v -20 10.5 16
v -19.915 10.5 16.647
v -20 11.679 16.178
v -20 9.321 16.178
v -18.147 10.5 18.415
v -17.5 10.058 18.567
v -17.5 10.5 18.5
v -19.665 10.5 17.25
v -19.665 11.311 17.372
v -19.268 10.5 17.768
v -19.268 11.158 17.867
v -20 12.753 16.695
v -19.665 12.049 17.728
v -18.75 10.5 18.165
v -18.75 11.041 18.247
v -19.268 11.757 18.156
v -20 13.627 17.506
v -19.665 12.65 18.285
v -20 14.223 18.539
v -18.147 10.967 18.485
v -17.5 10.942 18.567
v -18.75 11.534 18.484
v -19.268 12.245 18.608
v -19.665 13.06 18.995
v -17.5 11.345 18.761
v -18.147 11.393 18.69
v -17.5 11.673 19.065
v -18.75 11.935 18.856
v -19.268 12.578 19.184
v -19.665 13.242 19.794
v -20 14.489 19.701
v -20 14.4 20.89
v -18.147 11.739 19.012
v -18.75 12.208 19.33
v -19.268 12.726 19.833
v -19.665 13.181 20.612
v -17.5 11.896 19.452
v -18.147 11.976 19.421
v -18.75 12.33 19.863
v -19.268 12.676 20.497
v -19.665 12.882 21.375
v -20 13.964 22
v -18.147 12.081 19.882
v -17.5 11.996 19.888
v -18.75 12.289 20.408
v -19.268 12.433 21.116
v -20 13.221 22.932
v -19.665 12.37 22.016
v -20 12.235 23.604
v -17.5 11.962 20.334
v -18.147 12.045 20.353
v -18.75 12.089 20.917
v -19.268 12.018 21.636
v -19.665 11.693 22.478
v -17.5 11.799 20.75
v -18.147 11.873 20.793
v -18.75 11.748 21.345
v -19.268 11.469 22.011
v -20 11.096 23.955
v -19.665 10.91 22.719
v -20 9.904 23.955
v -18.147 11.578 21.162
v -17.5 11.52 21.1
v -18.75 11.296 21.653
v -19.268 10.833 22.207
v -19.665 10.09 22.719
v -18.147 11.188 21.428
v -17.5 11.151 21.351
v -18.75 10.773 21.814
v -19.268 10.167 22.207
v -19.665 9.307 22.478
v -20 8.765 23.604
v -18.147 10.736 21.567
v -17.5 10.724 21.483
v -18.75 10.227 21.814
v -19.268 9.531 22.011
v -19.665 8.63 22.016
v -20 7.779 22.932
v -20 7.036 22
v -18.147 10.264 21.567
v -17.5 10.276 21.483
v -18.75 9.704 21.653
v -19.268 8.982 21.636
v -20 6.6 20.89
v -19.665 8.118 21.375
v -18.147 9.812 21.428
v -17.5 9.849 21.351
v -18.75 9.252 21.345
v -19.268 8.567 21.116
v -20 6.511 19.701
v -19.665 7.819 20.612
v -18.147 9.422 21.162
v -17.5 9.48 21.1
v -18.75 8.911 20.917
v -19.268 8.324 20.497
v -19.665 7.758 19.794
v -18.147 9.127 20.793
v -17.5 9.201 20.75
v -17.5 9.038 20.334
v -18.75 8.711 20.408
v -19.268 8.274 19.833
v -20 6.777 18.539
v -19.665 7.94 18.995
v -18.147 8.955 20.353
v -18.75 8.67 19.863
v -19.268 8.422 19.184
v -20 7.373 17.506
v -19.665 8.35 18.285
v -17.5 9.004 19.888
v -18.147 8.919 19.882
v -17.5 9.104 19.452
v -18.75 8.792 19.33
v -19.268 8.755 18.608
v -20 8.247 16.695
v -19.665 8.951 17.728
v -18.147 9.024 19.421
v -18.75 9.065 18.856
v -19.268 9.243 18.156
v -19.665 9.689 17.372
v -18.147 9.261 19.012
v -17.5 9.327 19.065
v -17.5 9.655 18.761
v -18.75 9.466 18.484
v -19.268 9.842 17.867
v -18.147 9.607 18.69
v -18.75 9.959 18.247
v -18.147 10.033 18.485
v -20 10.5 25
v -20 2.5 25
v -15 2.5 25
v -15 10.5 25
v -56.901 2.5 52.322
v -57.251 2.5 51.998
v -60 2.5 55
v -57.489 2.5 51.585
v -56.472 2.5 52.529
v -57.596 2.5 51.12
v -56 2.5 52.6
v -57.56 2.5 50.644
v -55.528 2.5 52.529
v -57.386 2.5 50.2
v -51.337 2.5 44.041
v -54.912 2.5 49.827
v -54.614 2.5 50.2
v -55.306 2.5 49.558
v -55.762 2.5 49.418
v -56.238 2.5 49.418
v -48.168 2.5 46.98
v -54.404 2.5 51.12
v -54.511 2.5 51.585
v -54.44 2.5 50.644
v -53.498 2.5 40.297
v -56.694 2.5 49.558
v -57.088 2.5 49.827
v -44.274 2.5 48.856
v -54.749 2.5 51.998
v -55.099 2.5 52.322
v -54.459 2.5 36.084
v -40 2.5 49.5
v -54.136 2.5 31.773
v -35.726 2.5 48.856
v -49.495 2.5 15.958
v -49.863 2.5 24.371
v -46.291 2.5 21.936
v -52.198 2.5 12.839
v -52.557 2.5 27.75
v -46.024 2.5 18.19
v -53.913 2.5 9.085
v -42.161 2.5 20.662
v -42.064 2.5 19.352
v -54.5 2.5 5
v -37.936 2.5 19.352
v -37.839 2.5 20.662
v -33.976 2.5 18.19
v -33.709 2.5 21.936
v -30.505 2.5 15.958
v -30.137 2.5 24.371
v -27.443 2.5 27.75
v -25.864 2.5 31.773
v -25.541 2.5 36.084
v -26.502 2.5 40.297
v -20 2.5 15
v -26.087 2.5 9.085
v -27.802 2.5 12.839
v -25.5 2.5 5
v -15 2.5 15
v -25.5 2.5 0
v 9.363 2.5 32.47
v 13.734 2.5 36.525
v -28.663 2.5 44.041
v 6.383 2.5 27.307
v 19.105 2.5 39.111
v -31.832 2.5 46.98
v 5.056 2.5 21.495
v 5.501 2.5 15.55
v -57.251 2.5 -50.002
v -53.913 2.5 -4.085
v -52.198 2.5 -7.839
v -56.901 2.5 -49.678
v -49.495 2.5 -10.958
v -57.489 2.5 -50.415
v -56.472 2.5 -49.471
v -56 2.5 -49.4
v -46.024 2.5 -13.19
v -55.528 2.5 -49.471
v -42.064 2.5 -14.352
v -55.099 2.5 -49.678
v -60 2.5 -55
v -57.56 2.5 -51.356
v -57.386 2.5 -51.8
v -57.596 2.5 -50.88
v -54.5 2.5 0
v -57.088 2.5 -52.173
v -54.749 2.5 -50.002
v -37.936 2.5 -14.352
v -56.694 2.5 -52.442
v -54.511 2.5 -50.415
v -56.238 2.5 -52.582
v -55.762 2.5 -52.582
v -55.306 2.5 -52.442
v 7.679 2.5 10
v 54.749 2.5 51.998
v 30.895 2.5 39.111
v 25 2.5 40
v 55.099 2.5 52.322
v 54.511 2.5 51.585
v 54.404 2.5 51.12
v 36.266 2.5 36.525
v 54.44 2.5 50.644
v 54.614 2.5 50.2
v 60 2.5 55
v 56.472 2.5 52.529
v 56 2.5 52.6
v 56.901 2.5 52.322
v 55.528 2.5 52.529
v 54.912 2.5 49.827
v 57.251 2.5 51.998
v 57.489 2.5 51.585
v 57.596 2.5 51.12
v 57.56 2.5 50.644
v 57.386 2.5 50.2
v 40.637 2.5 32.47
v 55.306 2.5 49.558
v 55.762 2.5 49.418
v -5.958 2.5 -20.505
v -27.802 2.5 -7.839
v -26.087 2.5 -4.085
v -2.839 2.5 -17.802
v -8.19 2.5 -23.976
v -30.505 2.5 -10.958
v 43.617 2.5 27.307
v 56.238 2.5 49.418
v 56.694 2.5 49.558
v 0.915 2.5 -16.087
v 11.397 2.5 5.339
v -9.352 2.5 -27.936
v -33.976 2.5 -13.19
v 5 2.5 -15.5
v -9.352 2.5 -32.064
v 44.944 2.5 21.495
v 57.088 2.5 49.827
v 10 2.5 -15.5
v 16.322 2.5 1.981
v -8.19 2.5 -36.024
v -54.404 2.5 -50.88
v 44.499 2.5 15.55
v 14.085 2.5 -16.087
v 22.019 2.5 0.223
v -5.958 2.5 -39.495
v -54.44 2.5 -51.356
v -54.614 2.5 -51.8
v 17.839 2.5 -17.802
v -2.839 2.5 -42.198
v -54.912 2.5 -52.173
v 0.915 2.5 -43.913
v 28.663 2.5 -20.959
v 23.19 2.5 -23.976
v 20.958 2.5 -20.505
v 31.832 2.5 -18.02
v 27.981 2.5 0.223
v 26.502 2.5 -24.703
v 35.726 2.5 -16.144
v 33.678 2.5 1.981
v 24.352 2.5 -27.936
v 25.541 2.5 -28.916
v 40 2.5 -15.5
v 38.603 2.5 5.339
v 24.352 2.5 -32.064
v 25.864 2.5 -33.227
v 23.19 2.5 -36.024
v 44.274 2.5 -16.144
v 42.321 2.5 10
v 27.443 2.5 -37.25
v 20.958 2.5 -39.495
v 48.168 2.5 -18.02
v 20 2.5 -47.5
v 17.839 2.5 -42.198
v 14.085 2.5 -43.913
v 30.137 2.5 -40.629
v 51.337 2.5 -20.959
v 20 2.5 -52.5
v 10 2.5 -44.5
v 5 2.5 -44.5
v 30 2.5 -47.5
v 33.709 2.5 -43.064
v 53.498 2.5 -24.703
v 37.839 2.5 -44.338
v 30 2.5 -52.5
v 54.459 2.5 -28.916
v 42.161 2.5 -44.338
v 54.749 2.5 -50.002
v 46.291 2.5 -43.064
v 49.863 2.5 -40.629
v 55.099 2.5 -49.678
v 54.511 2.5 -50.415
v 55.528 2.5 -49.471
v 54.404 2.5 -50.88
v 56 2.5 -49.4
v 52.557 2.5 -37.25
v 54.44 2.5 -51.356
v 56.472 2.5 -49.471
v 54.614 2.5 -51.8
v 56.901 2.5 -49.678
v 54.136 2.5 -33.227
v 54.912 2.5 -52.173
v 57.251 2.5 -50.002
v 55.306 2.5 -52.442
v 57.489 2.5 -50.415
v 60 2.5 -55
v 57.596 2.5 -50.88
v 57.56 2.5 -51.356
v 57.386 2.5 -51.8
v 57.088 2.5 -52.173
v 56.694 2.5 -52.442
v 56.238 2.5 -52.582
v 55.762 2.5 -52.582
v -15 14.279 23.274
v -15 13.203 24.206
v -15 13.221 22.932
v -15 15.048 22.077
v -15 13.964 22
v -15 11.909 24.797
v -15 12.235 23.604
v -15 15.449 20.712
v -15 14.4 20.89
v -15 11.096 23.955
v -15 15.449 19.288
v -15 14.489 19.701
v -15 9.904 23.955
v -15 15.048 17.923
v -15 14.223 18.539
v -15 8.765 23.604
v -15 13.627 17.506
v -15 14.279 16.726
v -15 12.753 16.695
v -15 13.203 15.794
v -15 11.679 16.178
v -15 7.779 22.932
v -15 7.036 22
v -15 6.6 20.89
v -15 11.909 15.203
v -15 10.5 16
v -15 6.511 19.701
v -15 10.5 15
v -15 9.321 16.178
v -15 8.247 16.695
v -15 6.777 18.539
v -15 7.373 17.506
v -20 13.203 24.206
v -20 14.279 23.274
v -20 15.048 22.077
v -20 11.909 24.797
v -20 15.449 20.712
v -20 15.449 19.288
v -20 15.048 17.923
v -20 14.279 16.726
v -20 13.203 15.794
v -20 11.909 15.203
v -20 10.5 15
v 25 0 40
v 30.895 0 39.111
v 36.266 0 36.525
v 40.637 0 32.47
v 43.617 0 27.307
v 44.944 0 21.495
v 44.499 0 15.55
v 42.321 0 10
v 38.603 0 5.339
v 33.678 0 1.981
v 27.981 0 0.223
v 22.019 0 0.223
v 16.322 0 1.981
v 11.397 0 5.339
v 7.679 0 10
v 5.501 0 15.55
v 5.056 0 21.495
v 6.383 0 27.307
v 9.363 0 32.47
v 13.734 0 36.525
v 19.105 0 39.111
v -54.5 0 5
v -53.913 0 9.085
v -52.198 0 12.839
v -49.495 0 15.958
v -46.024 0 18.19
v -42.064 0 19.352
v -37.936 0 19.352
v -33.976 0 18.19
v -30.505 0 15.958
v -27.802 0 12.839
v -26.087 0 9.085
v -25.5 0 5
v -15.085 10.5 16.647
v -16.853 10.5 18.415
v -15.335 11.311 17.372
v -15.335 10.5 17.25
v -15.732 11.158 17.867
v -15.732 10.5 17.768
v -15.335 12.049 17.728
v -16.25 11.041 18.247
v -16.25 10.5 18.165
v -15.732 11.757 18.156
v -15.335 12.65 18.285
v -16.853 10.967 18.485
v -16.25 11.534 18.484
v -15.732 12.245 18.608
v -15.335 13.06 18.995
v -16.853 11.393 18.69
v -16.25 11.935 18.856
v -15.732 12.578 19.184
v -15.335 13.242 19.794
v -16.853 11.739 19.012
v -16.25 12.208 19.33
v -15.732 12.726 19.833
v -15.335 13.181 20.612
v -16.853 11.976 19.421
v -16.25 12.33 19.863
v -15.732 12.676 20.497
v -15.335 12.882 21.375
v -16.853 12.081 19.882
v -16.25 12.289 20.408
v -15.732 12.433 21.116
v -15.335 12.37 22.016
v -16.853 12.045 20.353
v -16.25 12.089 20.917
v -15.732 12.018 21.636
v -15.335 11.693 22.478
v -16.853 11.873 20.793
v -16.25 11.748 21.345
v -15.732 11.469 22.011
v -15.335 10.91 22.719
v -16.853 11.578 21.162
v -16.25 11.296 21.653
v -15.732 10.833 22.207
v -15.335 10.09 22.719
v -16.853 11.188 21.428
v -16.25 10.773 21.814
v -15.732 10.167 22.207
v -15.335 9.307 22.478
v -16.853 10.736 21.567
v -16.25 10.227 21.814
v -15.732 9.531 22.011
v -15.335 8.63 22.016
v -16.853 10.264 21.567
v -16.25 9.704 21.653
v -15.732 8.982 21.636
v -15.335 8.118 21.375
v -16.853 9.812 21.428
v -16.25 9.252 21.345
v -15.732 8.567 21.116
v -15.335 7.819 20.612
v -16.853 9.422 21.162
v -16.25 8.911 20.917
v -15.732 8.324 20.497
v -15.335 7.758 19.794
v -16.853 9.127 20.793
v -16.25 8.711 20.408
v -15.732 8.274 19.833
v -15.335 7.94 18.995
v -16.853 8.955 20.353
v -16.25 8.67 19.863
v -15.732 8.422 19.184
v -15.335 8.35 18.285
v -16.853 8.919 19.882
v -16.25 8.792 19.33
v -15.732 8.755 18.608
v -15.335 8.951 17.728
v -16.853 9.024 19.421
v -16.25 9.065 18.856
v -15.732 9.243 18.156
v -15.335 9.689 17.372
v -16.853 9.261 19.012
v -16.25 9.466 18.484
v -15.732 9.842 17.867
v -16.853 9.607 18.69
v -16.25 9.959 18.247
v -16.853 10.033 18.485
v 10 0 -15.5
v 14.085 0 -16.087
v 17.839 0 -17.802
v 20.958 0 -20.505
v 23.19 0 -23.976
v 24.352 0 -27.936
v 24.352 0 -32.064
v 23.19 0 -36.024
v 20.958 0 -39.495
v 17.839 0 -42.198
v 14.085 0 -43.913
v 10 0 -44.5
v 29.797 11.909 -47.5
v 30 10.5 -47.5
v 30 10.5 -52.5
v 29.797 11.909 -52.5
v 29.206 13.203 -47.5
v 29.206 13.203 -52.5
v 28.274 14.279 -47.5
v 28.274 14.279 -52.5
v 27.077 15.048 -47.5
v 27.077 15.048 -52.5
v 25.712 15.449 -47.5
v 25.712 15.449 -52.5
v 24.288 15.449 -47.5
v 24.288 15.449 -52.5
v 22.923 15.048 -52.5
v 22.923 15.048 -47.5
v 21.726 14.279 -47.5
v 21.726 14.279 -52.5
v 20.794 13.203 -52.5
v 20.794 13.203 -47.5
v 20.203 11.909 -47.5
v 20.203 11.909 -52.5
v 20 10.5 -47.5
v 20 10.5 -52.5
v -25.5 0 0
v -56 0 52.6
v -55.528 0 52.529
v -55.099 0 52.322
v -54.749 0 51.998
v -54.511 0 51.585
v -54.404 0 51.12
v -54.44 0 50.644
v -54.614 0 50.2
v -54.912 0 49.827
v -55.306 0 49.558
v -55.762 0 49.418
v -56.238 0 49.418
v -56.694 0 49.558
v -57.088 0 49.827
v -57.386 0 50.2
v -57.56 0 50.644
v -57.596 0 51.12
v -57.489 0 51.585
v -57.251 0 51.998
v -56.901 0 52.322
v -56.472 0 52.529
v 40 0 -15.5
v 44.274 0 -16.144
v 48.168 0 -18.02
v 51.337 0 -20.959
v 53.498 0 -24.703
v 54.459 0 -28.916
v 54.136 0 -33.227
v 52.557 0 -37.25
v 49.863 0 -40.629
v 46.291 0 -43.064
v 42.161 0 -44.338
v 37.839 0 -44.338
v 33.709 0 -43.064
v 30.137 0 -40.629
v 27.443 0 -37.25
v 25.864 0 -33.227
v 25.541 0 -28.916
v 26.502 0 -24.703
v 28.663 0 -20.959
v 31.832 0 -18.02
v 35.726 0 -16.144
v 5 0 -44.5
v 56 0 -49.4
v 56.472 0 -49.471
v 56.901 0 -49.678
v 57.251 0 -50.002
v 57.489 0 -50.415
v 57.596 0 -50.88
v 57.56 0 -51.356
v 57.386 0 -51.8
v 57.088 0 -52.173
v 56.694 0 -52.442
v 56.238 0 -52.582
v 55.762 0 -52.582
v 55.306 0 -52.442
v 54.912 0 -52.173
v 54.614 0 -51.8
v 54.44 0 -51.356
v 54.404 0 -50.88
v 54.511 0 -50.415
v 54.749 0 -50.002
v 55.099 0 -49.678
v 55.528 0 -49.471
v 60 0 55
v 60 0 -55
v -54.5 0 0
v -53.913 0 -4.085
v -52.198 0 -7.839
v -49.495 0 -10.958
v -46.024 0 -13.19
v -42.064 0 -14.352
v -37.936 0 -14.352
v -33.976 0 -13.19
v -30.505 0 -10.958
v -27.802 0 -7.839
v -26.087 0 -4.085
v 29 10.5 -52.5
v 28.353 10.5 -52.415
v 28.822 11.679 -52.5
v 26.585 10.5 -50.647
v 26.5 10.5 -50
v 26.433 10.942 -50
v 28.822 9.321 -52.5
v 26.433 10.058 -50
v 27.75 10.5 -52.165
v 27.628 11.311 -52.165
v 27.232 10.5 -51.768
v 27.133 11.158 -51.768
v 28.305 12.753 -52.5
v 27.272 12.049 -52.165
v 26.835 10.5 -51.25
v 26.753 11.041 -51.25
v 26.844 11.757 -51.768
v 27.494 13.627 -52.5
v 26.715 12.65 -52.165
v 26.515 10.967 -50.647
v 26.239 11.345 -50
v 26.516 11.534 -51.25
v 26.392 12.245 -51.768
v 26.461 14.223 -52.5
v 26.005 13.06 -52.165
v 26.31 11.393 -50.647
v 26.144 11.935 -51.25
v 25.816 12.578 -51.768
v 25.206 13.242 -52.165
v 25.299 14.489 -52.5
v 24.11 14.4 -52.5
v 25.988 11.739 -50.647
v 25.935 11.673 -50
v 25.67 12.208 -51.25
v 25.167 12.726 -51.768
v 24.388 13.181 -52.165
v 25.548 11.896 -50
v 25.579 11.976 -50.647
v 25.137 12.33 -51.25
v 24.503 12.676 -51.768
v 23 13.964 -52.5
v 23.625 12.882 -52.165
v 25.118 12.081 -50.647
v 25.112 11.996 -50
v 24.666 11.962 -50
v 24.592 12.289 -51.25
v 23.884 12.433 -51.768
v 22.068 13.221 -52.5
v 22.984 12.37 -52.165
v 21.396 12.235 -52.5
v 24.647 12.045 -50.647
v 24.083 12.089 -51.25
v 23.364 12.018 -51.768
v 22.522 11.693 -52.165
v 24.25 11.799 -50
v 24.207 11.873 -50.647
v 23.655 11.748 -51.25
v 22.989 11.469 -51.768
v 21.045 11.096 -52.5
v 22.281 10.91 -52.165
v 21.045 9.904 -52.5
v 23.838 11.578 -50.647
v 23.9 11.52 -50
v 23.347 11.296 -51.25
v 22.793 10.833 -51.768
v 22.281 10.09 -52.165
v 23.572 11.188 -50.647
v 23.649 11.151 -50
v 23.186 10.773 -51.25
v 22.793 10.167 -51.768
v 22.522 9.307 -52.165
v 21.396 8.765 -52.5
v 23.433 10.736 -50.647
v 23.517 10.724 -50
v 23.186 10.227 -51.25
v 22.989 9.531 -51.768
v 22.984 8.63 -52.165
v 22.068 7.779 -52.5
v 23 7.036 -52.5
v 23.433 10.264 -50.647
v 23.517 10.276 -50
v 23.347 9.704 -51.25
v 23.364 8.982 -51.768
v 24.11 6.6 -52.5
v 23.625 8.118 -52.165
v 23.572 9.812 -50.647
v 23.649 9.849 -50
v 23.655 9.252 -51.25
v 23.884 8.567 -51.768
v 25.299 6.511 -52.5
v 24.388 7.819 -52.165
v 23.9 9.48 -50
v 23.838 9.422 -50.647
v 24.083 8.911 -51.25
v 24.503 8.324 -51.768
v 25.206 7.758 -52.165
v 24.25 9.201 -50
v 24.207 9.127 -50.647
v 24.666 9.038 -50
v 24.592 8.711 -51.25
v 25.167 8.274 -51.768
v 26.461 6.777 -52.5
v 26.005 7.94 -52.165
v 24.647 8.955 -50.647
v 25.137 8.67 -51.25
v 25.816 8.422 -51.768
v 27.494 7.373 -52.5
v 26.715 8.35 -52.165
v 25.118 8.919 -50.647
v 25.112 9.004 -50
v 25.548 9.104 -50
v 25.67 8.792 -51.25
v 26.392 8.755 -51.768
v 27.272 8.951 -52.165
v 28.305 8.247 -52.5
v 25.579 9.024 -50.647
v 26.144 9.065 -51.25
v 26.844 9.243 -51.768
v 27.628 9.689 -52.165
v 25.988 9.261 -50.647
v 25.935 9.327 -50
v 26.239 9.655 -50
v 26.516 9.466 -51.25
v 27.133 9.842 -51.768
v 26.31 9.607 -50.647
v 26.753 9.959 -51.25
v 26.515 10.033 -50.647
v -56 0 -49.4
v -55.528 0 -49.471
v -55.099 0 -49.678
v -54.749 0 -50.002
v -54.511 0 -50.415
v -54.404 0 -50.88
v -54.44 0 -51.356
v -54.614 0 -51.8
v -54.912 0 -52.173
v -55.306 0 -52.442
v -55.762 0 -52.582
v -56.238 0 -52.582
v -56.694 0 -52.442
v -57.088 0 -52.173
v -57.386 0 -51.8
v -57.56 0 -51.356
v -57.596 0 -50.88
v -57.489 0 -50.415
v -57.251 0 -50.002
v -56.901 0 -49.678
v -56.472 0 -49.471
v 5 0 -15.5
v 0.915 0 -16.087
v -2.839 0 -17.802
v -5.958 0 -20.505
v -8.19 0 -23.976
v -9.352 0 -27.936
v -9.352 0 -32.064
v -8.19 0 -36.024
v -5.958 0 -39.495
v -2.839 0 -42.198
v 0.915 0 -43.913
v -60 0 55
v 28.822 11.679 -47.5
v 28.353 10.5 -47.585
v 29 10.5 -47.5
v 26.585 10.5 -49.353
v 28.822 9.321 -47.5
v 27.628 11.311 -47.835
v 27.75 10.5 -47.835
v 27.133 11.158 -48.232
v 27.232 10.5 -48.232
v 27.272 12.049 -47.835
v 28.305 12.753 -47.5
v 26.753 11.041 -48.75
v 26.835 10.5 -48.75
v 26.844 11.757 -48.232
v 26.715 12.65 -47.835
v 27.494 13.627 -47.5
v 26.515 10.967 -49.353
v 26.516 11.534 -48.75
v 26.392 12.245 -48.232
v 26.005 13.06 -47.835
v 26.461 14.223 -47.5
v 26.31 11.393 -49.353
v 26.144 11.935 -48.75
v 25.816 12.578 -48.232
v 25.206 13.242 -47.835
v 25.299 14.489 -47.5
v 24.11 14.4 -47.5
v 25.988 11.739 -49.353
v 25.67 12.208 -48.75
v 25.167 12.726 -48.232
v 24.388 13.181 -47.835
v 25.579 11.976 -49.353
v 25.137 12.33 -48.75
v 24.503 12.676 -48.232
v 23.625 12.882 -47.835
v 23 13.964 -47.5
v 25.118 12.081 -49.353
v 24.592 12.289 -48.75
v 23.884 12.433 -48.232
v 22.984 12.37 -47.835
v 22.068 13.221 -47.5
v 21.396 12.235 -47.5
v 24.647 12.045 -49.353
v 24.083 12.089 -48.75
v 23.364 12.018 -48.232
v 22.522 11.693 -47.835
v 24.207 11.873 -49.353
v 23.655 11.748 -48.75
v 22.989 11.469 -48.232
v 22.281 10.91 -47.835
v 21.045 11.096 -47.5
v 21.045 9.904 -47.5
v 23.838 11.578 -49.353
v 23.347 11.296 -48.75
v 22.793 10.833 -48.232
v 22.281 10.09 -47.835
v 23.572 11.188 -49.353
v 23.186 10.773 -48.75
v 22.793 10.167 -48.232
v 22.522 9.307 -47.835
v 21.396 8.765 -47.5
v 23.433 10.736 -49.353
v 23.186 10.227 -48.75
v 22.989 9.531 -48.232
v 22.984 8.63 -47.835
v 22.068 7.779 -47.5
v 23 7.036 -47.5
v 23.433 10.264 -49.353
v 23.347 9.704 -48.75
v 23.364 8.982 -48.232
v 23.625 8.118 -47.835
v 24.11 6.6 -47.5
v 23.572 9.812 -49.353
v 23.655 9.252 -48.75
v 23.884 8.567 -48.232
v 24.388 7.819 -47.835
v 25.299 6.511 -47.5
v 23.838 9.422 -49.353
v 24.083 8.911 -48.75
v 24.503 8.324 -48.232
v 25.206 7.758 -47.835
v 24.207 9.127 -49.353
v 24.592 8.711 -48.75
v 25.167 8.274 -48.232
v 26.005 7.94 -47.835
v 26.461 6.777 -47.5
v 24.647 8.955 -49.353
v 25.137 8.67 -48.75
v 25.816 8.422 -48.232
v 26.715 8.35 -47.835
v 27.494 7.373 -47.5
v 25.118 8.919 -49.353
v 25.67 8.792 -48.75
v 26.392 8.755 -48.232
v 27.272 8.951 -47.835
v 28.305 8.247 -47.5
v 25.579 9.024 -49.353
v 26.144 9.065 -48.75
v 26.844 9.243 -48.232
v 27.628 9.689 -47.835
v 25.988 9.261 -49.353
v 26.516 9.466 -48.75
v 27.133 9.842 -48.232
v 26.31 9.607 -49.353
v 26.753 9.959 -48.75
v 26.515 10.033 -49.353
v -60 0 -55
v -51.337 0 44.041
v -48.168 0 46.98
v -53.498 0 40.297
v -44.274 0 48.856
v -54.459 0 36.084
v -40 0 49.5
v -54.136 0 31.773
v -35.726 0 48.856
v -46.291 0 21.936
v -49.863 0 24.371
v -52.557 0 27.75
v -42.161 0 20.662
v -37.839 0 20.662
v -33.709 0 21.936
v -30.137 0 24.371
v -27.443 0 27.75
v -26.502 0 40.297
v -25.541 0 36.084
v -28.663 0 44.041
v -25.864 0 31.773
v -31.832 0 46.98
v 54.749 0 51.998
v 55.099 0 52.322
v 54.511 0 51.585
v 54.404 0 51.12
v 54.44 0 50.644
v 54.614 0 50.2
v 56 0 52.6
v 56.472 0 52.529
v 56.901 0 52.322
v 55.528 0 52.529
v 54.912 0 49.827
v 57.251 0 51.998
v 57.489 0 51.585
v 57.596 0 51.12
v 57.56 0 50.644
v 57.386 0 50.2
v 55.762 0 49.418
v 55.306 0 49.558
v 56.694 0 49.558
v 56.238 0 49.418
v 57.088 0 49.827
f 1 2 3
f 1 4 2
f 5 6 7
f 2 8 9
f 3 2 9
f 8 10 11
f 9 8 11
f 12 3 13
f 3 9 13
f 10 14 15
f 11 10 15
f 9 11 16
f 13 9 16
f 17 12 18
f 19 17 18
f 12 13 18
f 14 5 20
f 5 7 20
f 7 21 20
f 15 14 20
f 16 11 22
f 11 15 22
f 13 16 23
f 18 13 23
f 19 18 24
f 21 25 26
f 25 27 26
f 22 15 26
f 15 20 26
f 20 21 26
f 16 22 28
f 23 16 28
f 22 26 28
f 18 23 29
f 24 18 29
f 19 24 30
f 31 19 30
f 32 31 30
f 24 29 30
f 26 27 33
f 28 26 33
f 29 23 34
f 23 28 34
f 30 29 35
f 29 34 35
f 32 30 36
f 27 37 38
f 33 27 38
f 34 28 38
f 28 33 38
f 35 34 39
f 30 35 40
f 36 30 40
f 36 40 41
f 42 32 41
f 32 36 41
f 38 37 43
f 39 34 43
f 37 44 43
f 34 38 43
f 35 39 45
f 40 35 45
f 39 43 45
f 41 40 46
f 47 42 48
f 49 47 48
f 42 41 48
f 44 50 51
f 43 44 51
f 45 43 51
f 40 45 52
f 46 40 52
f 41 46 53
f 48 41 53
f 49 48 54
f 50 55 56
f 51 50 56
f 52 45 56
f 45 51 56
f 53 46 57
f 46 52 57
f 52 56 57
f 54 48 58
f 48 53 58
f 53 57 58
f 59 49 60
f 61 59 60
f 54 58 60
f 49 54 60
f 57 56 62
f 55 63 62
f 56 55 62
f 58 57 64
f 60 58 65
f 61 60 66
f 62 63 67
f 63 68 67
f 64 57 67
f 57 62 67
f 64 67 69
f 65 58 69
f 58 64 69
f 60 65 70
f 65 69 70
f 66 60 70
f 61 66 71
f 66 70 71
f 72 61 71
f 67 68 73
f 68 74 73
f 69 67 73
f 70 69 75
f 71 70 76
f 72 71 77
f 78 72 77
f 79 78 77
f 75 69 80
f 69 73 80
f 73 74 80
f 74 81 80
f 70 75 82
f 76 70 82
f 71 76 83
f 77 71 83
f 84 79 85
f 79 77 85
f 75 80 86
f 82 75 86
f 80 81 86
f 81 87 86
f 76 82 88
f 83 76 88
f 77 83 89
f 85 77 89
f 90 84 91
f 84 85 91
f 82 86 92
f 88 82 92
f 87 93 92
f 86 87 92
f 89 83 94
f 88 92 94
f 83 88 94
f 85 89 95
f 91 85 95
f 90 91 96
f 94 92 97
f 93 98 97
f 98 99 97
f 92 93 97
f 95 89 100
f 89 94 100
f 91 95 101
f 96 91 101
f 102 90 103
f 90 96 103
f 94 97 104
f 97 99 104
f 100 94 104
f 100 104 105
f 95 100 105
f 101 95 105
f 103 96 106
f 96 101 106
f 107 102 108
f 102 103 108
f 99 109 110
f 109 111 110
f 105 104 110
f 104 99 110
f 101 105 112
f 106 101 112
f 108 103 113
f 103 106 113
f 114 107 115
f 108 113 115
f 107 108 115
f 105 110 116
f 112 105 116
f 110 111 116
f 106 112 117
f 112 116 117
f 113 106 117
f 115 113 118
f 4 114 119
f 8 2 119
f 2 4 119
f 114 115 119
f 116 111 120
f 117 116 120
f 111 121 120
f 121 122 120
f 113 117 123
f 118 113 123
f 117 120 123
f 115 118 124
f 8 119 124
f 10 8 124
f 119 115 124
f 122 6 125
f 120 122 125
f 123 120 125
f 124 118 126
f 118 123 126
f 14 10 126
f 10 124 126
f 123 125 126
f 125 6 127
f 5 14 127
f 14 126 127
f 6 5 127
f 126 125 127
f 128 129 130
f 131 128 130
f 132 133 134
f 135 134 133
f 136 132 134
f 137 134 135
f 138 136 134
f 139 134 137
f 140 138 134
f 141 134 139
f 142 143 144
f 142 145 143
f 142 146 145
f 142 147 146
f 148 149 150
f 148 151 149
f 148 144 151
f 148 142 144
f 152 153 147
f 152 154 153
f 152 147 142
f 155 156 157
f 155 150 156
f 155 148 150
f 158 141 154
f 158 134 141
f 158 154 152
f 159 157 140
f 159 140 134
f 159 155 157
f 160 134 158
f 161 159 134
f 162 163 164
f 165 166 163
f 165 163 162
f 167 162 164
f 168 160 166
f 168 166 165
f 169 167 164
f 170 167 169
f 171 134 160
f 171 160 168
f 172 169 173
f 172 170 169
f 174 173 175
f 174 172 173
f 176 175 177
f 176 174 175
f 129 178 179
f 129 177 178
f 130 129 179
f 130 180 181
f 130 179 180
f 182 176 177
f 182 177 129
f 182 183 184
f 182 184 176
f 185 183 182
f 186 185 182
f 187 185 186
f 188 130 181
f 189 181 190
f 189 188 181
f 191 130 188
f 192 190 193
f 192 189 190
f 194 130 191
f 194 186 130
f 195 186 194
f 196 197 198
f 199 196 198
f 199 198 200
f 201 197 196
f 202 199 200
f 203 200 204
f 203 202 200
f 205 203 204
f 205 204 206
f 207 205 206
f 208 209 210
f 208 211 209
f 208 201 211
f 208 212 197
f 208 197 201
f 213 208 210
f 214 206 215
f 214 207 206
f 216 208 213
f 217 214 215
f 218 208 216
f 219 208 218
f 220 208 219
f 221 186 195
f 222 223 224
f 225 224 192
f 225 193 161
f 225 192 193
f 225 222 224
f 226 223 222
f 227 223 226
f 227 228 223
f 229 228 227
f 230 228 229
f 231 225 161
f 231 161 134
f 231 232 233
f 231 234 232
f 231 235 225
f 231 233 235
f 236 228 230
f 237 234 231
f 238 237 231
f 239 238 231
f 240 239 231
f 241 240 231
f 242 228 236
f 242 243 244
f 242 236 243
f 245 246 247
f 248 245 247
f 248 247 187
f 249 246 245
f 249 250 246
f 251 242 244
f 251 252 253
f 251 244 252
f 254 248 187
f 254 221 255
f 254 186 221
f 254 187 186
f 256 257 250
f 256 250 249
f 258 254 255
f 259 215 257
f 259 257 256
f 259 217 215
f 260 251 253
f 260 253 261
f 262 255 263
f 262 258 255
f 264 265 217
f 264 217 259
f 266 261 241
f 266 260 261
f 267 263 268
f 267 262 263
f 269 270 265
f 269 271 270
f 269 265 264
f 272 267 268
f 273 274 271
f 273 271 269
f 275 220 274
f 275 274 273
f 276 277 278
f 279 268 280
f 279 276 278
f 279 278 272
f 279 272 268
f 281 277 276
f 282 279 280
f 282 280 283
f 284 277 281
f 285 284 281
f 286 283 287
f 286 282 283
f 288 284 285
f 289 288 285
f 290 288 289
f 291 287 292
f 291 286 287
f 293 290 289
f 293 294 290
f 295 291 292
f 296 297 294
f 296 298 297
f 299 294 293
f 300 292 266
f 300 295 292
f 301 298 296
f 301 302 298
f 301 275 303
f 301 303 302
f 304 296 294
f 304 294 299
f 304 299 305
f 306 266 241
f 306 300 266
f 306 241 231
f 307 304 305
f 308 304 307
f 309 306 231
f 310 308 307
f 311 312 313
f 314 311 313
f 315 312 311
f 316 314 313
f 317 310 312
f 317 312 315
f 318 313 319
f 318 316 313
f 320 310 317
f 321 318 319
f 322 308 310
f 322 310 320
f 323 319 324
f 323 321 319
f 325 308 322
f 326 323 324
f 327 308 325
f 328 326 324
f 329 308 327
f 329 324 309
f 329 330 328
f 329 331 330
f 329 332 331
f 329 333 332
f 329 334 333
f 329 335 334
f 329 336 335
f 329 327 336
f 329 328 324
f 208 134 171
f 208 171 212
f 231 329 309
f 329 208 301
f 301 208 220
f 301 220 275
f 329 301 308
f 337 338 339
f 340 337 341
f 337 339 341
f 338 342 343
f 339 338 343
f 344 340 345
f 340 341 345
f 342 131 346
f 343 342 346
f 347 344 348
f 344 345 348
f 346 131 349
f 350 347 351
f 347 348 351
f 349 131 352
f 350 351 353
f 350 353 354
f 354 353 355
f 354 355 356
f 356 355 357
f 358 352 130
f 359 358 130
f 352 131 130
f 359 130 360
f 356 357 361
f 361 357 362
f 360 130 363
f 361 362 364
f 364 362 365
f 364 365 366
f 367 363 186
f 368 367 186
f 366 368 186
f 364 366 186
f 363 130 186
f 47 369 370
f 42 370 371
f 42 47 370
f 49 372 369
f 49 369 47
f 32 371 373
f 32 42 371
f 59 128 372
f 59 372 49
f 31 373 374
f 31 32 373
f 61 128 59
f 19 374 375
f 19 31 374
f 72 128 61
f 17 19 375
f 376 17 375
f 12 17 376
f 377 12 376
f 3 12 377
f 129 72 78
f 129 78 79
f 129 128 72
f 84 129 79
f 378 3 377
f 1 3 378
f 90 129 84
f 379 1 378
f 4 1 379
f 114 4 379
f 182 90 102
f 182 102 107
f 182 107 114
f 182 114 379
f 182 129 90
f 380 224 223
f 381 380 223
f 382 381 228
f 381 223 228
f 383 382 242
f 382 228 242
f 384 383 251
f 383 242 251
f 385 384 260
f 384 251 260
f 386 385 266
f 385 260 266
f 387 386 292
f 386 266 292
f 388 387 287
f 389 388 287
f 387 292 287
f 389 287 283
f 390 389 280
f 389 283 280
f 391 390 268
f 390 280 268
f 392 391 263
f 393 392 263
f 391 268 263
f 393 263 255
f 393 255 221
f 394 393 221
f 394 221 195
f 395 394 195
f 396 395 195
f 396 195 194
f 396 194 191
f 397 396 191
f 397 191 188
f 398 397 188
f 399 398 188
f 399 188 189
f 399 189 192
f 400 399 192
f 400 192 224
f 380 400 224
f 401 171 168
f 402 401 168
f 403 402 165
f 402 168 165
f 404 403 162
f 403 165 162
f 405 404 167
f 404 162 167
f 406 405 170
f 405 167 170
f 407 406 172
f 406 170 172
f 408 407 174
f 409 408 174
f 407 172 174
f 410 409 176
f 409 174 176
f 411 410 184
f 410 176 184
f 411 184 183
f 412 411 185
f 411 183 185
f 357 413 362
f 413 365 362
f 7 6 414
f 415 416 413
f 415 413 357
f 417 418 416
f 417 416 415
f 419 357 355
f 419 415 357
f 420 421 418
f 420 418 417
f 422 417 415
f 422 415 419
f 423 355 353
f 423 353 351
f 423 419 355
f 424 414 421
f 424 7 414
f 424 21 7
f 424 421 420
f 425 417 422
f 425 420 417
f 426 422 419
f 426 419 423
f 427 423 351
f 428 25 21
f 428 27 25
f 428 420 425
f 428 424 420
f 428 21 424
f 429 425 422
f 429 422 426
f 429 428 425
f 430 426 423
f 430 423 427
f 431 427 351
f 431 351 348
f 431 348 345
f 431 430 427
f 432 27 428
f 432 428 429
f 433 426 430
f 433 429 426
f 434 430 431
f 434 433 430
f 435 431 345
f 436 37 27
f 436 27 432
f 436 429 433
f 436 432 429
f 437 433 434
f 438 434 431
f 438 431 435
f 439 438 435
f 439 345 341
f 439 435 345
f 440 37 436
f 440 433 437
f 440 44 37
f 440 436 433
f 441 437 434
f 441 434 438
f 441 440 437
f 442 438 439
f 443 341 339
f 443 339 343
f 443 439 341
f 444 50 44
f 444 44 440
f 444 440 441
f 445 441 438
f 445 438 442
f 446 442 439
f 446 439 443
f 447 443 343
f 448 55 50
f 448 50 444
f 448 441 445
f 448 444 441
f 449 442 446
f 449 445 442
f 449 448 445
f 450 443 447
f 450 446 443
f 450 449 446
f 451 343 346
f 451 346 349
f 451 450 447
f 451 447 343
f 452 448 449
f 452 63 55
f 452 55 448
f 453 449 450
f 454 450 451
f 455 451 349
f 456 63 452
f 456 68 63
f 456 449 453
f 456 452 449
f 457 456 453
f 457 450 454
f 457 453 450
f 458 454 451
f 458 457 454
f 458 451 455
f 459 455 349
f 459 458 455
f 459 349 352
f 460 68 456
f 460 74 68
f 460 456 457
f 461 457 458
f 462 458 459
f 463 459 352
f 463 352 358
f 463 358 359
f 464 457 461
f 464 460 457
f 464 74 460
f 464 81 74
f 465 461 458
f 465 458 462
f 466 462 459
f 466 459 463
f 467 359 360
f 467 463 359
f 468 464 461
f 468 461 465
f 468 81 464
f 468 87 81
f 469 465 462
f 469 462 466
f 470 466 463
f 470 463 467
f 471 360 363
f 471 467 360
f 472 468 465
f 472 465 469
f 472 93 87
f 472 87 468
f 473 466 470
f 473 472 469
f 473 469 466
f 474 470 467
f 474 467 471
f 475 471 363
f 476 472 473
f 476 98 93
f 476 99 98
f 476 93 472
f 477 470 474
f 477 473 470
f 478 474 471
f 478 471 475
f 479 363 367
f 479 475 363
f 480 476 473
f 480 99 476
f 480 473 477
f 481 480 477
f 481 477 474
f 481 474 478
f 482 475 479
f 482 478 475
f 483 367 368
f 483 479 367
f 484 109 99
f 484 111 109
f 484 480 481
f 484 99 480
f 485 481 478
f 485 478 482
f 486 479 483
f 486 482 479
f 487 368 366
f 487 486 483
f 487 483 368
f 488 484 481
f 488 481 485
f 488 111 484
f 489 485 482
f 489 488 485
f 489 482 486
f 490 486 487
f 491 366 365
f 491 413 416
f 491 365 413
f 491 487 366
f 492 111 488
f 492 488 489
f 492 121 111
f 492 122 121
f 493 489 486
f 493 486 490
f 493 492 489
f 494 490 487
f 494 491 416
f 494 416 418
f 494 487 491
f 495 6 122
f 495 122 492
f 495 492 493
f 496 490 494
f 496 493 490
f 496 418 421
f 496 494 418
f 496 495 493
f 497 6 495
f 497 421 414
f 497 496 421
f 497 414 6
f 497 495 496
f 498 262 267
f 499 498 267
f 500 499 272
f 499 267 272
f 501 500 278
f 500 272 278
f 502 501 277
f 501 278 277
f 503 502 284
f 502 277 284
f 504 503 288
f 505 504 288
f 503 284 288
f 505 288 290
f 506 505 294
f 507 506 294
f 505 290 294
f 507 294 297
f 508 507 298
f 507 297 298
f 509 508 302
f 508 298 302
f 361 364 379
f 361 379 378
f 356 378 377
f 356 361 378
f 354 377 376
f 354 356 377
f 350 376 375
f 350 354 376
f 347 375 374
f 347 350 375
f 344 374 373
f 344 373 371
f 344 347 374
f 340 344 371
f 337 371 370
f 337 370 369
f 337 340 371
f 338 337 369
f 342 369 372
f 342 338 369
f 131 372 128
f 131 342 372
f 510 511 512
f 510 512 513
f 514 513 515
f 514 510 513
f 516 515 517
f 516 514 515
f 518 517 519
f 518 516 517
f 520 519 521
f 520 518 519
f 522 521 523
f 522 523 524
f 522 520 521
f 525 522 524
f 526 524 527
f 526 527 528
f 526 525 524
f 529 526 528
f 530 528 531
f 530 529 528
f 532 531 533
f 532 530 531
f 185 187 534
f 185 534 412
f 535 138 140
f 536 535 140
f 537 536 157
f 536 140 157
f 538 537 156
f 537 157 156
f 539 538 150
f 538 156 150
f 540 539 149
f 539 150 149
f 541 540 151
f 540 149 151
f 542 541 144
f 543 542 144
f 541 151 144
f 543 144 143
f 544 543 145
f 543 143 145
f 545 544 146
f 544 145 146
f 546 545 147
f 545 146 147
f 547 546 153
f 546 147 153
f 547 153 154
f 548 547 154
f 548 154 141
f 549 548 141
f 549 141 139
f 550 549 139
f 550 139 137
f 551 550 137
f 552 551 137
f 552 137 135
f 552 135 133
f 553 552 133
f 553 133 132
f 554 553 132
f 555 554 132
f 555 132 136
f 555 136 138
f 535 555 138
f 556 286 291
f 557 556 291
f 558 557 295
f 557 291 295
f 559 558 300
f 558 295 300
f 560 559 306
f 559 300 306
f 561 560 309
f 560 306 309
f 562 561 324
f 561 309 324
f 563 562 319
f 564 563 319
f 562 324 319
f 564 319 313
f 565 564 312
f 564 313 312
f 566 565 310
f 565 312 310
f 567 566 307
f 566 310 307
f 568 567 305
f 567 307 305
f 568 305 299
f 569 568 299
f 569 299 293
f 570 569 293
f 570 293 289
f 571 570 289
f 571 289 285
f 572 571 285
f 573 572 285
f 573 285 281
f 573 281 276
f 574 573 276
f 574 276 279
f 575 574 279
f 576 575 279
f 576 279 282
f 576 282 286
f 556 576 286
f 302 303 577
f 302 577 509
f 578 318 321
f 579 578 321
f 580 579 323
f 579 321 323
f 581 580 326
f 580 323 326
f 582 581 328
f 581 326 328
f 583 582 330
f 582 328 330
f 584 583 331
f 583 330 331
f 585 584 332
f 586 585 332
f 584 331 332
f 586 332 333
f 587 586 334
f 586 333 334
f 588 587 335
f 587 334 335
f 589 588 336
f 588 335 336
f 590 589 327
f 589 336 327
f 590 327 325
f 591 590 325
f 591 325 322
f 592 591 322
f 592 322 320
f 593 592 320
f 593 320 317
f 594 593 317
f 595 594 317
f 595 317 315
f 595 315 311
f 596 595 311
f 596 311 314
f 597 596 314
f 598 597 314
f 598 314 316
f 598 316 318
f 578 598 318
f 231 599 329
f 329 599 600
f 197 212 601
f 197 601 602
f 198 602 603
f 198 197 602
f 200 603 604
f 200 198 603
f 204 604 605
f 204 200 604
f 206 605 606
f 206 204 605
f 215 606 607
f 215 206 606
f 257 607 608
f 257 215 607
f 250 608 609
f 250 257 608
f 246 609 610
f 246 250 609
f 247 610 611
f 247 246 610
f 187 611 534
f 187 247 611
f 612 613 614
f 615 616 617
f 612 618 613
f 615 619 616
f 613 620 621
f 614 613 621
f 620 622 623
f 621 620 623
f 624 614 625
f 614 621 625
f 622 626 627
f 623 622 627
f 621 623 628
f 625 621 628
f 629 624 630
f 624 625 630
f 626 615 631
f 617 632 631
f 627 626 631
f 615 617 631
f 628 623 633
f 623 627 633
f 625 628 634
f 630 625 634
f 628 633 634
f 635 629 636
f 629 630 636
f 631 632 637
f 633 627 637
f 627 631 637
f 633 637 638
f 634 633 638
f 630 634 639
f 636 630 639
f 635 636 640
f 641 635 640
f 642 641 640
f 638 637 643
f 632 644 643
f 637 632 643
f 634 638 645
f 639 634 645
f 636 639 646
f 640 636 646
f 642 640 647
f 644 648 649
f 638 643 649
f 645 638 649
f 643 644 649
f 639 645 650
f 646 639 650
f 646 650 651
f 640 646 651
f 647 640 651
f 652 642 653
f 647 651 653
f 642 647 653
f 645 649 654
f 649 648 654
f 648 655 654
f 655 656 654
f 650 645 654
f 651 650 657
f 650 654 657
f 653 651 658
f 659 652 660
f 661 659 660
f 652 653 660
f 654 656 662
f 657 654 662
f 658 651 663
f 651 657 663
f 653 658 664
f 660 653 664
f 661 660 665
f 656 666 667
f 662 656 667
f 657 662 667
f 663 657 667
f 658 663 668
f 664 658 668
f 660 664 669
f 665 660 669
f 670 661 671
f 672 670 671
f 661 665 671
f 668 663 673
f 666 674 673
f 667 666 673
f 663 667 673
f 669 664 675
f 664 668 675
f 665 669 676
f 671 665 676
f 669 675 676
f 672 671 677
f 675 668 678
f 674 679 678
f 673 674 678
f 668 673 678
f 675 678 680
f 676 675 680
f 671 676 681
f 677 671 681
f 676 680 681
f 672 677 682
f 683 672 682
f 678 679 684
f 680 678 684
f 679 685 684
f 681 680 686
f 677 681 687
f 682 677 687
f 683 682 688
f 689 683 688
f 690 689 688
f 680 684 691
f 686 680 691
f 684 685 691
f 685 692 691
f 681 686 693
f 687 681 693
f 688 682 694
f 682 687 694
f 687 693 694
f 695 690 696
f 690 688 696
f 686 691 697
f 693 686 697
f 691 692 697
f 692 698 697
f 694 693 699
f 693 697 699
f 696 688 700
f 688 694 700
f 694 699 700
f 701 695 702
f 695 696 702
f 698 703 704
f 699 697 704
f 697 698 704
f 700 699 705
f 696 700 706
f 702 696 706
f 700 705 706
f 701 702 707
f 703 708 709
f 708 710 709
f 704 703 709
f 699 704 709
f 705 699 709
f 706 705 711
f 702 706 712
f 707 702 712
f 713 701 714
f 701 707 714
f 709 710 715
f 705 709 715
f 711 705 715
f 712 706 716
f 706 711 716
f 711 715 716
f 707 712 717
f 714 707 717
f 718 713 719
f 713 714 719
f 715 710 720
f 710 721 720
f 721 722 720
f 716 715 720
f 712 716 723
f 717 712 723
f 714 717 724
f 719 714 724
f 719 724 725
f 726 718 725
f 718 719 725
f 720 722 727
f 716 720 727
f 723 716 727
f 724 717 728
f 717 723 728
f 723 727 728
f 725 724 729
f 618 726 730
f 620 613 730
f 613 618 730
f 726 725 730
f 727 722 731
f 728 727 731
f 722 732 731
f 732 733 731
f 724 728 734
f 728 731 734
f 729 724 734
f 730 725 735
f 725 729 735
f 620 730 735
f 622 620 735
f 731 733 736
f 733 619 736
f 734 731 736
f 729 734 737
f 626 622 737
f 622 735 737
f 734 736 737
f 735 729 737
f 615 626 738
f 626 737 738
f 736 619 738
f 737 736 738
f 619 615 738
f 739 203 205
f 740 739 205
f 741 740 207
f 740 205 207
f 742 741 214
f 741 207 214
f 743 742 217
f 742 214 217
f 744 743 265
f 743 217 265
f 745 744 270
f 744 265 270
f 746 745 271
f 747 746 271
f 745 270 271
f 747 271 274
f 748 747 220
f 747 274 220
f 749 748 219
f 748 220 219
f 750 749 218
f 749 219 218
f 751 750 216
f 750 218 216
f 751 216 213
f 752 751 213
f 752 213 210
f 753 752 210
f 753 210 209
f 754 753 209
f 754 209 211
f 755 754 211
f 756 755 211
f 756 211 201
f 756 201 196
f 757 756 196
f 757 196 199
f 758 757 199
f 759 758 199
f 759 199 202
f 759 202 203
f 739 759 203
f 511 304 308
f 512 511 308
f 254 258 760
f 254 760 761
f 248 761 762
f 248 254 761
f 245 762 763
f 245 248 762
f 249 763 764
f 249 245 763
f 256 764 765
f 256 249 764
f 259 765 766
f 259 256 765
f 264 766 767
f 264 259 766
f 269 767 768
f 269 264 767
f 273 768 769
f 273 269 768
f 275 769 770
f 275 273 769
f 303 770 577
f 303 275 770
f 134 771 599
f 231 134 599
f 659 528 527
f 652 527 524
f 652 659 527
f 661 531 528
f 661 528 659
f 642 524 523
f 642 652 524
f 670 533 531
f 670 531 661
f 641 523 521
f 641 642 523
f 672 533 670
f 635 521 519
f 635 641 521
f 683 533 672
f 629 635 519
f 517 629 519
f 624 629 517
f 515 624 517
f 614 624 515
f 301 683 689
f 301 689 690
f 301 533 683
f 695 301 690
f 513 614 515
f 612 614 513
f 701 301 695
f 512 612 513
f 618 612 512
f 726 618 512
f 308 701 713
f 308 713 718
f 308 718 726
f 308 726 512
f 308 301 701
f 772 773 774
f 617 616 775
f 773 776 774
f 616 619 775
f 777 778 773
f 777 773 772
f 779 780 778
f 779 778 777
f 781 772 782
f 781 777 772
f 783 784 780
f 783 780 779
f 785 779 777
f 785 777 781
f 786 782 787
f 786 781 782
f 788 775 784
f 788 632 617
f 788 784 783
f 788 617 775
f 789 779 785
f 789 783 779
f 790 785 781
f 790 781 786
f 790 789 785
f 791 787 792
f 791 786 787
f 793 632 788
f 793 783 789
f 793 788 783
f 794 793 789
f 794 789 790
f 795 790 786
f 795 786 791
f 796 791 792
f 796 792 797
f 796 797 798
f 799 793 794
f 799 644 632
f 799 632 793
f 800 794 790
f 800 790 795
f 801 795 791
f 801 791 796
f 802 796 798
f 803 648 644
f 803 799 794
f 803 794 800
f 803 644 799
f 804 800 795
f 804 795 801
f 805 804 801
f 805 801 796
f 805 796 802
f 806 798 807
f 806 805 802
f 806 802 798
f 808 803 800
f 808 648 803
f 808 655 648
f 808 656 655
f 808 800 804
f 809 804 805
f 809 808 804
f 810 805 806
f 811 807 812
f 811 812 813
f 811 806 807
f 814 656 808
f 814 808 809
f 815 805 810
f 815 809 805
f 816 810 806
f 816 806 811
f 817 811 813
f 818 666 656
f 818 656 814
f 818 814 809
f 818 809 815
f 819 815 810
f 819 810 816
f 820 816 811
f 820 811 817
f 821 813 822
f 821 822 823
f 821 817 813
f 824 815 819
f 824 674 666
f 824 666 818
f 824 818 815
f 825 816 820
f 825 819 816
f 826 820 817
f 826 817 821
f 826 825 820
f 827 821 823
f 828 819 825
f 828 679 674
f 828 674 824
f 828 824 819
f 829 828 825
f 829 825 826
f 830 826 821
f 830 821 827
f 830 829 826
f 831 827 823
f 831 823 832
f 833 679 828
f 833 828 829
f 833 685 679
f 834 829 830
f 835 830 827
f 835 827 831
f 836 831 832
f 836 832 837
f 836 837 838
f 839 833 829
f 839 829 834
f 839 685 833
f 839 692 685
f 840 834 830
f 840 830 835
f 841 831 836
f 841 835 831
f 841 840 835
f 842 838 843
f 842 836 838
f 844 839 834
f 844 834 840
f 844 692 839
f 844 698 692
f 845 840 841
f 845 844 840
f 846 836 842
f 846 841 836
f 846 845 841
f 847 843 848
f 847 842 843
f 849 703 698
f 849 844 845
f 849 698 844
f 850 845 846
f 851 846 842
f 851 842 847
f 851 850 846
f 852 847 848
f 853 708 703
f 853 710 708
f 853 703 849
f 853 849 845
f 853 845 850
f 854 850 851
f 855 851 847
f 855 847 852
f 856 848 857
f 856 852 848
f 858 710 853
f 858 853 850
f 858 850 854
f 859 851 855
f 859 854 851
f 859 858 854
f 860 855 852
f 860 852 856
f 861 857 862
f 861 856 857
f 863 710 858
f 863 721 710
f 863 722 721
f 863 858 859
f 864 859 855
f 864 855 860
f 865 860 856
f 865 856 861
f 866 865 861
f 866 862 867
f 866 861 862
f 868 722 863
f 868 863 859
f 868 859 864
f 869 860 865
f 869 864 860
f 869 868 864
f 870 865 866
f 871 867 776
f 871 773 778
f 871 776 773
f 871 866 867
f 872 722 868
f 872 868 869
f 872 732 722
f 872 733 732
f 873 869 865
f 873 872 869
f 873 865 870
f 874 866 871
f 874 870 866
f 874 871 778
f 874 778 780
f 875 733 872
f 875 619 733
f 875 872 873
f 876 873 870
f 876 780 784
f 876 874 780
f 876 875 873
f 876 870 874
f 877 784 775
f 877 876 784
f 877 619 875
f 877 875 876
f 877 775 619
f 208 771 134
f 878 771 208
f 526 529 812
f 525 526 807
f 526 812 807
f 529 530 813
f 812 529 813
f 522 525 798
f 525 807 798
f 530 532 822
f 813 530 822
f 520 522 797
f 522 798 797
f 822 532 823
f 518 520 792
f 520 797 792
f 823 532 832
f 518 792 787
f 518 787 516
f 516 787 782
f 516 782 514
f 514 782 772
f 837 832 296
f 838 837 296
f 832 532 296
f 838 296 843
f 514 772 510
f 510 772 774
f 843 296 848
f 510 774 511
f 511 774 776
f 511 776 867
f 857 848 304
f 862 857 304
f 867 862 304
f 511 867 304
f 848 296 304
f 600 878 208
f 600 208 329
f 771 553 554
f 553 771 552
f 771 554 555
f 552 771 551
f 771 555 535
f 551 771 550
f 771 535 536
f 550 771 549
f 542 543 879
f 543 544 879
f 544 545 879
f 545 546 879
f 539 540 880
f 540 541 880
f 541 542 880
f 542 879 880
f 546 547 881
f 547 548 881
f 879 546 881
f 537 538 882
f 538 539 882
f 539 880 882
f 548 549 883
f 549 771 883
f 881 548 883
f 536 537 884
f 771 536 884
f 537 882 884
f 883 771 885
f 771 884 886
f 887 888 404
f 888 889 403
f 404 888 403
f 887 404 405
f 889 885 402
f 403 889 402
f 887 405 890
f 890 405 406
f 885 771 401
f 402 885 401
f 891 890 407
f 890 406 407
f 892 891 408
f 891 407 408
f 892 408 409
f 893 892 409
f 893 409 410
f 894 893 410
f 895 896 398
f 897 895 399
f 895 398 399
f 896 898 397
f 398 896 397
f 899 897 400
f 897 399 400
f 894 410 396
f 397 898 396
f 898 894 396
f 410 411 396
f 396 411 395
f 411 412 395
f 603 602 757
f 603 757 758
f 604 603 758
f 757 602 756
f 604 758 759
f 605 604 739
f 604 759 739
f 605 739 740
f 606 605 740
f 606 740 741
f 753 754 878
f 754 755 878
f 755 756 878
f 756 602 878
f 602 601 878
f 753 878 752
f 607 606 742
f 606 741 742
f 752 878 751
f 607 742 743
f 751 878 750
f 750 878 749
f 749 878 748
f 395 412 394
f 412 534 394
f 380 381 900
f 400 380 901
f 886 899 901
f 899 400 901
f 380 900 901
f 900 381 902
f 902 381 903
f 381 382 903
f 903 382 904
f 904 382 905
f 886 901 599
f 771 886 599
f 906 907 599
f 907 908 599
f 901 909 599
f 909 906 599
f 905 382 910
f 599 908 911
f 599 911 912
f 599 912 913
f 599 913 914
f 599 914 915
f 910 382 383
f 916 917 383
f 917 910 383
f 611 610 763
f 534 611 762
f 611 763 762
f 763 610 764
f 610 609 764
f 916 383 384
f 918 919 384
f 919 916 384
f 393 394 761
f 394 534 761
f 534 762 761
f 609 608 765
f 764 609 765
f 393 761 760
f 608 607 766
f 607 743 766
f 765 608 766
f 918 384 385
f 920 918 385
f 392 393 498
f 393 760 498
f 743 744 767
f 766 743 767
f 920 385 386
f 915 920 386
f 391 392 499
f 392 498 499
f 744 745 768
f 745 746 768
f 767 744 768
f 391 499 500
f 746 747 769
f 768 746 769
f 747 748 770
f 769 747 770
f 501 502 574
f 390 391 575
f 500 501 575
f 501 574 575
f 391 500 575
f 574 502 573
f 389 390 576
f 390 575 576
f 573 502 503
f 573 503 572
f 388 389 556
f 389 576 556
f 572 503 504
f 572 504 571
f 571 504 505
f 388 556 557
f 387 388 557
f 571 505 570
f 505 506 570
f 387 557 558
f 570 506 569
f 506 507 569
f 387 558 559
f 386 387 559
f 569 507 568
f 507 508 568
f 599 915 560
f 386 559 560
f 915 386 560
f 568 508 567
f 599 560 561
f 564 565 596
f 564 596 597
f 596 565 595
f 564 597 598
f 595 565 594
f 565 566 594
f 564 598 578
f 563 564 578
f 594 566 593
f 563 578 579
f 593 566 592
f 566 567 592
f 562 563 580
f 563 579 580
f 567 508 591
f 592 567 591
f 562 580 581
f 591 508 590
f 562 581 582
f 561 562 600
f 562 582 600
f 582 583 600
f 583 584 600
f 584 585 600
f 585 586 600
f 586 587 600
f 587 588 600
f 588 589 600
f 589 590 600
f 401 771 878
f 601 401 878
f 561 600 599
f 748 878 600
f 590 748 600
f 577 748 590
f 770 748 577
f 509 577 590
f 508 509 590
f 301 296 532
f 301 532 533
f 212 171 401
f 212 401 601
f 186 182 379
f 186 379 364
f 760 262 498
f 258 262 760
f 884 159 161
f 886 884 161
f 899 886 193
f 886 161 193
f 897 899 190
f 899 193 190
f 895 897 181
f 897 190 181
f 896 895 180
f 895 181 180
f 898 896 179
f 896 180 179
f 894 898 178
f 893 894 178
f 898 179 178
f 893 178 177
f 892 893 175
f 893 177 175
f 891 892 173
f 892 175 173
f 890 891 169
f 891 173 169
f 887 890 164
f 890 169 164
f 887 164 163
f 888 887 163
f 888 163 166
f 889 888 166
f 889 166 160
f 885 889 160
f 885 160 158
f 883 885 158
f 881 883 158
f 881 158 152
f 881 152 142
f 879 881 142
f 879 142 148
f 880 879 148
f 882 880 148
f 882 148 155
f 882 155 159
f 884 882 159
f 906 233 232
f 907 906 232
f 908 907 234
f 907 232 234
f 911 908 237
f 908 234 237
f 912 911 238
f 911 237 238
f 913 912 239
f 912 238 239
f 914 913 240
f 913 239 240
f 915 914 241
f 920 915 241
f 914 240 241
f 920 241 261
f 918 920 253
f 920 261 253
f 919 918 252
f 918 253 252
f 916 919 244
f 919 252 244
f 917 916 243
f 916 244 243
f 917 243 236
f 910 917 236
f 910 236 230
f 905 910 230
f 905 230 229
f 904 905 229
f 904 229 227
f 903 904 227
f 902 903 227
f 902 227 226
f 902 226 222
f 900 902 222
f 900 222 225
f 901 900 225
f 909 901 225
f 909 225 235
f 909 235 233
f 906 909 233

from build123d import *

# Parameters (mm, degrees)
SKETCH1_W           = 120
SKETCH1_H           = 110
BOSS_EXTRUDE1_DEPTH = 2.5
SKETCH2_R           = 14.5
CUT_EXTRUDE1_DEPTH  = 4
SKETCH3_R           = 20
CUT_EXTRUDE2_DEPTH  = 10
SKETCH5_R           = 1.6
CUT_EXTRUDE5_DEPTH  = 10
CUT_EXTRUDE6_DEPTH  = 10
SKETCH8_W           = 5
SKETCH8_H           = 10
SKETCH8_W_2         = 10
SKETCH8_H_2         = 5
BOSS_EXTRUDE2_DEPTH = 14
SKETCH9_R           = 1.5
CUT_EXTRUDE7_DEPTH  = 120.910383203
SKETCH10_R          = 1.5
CUT_EXTRUDE8_DEPTH  = 5
FILLET1_R           = 2.5


with BuildPart() as part:
    # Sketch1 → Boss-Extrude1 (new body)
    with BuildSketch(Plane(origin=(0, 0, 0), x_dir=(1, 0, 0), z_dir=(0, 1, 0))):
        Rectangle(SKETCH1_W, SKETCH1_H)
    extrude(amount=BOSS_EXTRUDE1_DEPTH)

    # Sketch2 → Cut-Extrude1 (cut)
    with BuildSketch(Plane(origin=(0, 2.5, 0), x_dir=(1, 0, 0), z_dir=(0, 1, 0))):
        with Locations(Location((40, 30, 0), (0, 0, 270))):
            Circle(SKETCH2_R)
        with Locations(Location((10, 30, 0), (0, 0, 270))):
            Circle(SKETCH2_R)
        with Locations(Location((-40, -5, 0), (0, 0, 270))):
            Circle(SKETCH2_R)
        with Locations(Location((-40, -35, 0), (0, 0, 270))):
            Circle(SKETCH2_R)
    extrude(amount=-CUT_EXTRUDE1_DEPTH, mode=Mode.SUBTRACT)

    # Sketch3 → Cut-Extrude2 (cut)
    with BuildSketch(Plane(origin=(0, 2.5, 0), x_dir=(1, 0, 0), z_dir=(0, 1, 0))):
        with Locations(Location((25, -20, 0), (0, 0, 270))):
            Circle(SKETCH3_R)
    extrude(amount=-CUT_EXTRUDE2_DEPTH, mode=Mode.SUBTRACT)

    # Sketch5 → Cut-Extrude5 (cut)
    with BuildSketch(Plane(origin=(0, 2.5, 0), x_dir=(1, 0, 0), z_dir=(0, 1, 0))):
        with Locations(Location((-56, 51, 0), (0, 0, 270))):
            Circle(SKETCH5_R)
        with Locations(Location((56, 51, 0), (0, 0, 270))):
            Circle(SKETCH5_R)
        with Locations(Location((56, -51, 0), (0, 0, 270))):
            Circle(SKETCH5_R)
        with Locations(Location((-56, -51, 0), (0, 0, 270))):
            Circle(SKETCH5_R)
    extrude(amount=-CUT_EXTRUDE5_DEPTH, mode=Mode.SUBTRACT)

    # Sketch7 → Cut-Extrude6 (cut)
    with BuildSketch(Plane(origin=(0, 2.5, 0), x_dir=(1, 0, 0), z_dir=(0, 1, 0))):
        with BuildLine():
            Line((-54.5, -5), (-54.5, 0))
            ThreePointArc((-54.5, 0), (-40, 14.5), (-25.5, 0))
            Line((-25.5, 0), (-25.5, -5))
            ThreePointArc((-25.5, -5), (-40, -19.5), (-54.5, -5))
        make_face()
        with BuildLine():
            Line((10, 15.5), (5, 15.5))
            ThreePointArc((5, 15.5), (-9.5, 30), (5, 44.5))
            Line((5, 44.5), (10, 44.5))
            ThreePointArc((10, 44.5), (24.5, 30), (10, 15.5))
        make_face()
    extrude(amount=-CUT_EXTRUDE6_DEPTH, mode=Mode.SUBTRACT)

    # Sketch8 → Boss-Extrude2 (add)
    with BuildSketch(Plane(origin=(0, 2.5, 0), x_dir=(1, 0, 0), z_dir=(0, 1, 0))):
        with Locations((-17.5, -20)):
            Rectangle(SKETCH8_W, SKETCH8_H)
        with Locations((25, 50)):
            Rectangle(SKETCH8_W_2, SKETCH8_H_2)
    extrude(amount=BOSS_EXTRUDE2_DEPTH)

    # Sketch9 → Cut-Extrude7 (cut, through all)
    with BuildSketch(Plane.XY.offset(-47.5)):
        with Locations((25, 10.5)):
            Circle(SKETCH9_R)
        with BuildLine():
            Line((20, 10.5), (20, 22.099022081))
            Line((20, 22.099022081), (30, 22.099022081))
            Line((30, 22.099022081), (30, 10.5))
            ThreePointArc((30, 10.5), (25, 15.5), (20, 10.5))
        make_face()
    extrude(amount=-CUT_EXTRUDE7_DEPTH, mode=Mode.SUBTRACT)

    # Sketch10 → Cut-Extrude8 (cut)
    with BuildSketch(Plane(origin=(-15, 0, 0), x_dir=(0, 0, -1), z_dir=(1, 0, 0))):
        with Locations((-20, 10.5)):
            Circle(SKETCH10_R)
        with BuildLine():
            Line((-25, 10.5), (-25, 23.531098802))
            Line((-25, 23.531098802), (-15, 23.531098802))
            Line((-15, 23.531098802), (-15, 10.5))
            ThreePointArc((-15, 10.5), (-20, 15.5), (-25, 10.5))
        make_face()
    extrude(amount=-CUT_EXTRUDE8_DEPTH, mode=Mode.SUBTRACT)

    # Fillet1
    fillet1_edges = [part.edges().sort_by_distance(p)[0] for p in [
        (23.5, 10.5, -52.5),
        (23.5, 10.5, -47.5),
        (-20, 10.5, 21.5),
        (-15, 10.5, 21.5),
    ]]
    fillet(fillet1_edges, radius=FILLET1_R - 0.0001)  # a hair under: the kernel refuses the full size


solid = part.part
